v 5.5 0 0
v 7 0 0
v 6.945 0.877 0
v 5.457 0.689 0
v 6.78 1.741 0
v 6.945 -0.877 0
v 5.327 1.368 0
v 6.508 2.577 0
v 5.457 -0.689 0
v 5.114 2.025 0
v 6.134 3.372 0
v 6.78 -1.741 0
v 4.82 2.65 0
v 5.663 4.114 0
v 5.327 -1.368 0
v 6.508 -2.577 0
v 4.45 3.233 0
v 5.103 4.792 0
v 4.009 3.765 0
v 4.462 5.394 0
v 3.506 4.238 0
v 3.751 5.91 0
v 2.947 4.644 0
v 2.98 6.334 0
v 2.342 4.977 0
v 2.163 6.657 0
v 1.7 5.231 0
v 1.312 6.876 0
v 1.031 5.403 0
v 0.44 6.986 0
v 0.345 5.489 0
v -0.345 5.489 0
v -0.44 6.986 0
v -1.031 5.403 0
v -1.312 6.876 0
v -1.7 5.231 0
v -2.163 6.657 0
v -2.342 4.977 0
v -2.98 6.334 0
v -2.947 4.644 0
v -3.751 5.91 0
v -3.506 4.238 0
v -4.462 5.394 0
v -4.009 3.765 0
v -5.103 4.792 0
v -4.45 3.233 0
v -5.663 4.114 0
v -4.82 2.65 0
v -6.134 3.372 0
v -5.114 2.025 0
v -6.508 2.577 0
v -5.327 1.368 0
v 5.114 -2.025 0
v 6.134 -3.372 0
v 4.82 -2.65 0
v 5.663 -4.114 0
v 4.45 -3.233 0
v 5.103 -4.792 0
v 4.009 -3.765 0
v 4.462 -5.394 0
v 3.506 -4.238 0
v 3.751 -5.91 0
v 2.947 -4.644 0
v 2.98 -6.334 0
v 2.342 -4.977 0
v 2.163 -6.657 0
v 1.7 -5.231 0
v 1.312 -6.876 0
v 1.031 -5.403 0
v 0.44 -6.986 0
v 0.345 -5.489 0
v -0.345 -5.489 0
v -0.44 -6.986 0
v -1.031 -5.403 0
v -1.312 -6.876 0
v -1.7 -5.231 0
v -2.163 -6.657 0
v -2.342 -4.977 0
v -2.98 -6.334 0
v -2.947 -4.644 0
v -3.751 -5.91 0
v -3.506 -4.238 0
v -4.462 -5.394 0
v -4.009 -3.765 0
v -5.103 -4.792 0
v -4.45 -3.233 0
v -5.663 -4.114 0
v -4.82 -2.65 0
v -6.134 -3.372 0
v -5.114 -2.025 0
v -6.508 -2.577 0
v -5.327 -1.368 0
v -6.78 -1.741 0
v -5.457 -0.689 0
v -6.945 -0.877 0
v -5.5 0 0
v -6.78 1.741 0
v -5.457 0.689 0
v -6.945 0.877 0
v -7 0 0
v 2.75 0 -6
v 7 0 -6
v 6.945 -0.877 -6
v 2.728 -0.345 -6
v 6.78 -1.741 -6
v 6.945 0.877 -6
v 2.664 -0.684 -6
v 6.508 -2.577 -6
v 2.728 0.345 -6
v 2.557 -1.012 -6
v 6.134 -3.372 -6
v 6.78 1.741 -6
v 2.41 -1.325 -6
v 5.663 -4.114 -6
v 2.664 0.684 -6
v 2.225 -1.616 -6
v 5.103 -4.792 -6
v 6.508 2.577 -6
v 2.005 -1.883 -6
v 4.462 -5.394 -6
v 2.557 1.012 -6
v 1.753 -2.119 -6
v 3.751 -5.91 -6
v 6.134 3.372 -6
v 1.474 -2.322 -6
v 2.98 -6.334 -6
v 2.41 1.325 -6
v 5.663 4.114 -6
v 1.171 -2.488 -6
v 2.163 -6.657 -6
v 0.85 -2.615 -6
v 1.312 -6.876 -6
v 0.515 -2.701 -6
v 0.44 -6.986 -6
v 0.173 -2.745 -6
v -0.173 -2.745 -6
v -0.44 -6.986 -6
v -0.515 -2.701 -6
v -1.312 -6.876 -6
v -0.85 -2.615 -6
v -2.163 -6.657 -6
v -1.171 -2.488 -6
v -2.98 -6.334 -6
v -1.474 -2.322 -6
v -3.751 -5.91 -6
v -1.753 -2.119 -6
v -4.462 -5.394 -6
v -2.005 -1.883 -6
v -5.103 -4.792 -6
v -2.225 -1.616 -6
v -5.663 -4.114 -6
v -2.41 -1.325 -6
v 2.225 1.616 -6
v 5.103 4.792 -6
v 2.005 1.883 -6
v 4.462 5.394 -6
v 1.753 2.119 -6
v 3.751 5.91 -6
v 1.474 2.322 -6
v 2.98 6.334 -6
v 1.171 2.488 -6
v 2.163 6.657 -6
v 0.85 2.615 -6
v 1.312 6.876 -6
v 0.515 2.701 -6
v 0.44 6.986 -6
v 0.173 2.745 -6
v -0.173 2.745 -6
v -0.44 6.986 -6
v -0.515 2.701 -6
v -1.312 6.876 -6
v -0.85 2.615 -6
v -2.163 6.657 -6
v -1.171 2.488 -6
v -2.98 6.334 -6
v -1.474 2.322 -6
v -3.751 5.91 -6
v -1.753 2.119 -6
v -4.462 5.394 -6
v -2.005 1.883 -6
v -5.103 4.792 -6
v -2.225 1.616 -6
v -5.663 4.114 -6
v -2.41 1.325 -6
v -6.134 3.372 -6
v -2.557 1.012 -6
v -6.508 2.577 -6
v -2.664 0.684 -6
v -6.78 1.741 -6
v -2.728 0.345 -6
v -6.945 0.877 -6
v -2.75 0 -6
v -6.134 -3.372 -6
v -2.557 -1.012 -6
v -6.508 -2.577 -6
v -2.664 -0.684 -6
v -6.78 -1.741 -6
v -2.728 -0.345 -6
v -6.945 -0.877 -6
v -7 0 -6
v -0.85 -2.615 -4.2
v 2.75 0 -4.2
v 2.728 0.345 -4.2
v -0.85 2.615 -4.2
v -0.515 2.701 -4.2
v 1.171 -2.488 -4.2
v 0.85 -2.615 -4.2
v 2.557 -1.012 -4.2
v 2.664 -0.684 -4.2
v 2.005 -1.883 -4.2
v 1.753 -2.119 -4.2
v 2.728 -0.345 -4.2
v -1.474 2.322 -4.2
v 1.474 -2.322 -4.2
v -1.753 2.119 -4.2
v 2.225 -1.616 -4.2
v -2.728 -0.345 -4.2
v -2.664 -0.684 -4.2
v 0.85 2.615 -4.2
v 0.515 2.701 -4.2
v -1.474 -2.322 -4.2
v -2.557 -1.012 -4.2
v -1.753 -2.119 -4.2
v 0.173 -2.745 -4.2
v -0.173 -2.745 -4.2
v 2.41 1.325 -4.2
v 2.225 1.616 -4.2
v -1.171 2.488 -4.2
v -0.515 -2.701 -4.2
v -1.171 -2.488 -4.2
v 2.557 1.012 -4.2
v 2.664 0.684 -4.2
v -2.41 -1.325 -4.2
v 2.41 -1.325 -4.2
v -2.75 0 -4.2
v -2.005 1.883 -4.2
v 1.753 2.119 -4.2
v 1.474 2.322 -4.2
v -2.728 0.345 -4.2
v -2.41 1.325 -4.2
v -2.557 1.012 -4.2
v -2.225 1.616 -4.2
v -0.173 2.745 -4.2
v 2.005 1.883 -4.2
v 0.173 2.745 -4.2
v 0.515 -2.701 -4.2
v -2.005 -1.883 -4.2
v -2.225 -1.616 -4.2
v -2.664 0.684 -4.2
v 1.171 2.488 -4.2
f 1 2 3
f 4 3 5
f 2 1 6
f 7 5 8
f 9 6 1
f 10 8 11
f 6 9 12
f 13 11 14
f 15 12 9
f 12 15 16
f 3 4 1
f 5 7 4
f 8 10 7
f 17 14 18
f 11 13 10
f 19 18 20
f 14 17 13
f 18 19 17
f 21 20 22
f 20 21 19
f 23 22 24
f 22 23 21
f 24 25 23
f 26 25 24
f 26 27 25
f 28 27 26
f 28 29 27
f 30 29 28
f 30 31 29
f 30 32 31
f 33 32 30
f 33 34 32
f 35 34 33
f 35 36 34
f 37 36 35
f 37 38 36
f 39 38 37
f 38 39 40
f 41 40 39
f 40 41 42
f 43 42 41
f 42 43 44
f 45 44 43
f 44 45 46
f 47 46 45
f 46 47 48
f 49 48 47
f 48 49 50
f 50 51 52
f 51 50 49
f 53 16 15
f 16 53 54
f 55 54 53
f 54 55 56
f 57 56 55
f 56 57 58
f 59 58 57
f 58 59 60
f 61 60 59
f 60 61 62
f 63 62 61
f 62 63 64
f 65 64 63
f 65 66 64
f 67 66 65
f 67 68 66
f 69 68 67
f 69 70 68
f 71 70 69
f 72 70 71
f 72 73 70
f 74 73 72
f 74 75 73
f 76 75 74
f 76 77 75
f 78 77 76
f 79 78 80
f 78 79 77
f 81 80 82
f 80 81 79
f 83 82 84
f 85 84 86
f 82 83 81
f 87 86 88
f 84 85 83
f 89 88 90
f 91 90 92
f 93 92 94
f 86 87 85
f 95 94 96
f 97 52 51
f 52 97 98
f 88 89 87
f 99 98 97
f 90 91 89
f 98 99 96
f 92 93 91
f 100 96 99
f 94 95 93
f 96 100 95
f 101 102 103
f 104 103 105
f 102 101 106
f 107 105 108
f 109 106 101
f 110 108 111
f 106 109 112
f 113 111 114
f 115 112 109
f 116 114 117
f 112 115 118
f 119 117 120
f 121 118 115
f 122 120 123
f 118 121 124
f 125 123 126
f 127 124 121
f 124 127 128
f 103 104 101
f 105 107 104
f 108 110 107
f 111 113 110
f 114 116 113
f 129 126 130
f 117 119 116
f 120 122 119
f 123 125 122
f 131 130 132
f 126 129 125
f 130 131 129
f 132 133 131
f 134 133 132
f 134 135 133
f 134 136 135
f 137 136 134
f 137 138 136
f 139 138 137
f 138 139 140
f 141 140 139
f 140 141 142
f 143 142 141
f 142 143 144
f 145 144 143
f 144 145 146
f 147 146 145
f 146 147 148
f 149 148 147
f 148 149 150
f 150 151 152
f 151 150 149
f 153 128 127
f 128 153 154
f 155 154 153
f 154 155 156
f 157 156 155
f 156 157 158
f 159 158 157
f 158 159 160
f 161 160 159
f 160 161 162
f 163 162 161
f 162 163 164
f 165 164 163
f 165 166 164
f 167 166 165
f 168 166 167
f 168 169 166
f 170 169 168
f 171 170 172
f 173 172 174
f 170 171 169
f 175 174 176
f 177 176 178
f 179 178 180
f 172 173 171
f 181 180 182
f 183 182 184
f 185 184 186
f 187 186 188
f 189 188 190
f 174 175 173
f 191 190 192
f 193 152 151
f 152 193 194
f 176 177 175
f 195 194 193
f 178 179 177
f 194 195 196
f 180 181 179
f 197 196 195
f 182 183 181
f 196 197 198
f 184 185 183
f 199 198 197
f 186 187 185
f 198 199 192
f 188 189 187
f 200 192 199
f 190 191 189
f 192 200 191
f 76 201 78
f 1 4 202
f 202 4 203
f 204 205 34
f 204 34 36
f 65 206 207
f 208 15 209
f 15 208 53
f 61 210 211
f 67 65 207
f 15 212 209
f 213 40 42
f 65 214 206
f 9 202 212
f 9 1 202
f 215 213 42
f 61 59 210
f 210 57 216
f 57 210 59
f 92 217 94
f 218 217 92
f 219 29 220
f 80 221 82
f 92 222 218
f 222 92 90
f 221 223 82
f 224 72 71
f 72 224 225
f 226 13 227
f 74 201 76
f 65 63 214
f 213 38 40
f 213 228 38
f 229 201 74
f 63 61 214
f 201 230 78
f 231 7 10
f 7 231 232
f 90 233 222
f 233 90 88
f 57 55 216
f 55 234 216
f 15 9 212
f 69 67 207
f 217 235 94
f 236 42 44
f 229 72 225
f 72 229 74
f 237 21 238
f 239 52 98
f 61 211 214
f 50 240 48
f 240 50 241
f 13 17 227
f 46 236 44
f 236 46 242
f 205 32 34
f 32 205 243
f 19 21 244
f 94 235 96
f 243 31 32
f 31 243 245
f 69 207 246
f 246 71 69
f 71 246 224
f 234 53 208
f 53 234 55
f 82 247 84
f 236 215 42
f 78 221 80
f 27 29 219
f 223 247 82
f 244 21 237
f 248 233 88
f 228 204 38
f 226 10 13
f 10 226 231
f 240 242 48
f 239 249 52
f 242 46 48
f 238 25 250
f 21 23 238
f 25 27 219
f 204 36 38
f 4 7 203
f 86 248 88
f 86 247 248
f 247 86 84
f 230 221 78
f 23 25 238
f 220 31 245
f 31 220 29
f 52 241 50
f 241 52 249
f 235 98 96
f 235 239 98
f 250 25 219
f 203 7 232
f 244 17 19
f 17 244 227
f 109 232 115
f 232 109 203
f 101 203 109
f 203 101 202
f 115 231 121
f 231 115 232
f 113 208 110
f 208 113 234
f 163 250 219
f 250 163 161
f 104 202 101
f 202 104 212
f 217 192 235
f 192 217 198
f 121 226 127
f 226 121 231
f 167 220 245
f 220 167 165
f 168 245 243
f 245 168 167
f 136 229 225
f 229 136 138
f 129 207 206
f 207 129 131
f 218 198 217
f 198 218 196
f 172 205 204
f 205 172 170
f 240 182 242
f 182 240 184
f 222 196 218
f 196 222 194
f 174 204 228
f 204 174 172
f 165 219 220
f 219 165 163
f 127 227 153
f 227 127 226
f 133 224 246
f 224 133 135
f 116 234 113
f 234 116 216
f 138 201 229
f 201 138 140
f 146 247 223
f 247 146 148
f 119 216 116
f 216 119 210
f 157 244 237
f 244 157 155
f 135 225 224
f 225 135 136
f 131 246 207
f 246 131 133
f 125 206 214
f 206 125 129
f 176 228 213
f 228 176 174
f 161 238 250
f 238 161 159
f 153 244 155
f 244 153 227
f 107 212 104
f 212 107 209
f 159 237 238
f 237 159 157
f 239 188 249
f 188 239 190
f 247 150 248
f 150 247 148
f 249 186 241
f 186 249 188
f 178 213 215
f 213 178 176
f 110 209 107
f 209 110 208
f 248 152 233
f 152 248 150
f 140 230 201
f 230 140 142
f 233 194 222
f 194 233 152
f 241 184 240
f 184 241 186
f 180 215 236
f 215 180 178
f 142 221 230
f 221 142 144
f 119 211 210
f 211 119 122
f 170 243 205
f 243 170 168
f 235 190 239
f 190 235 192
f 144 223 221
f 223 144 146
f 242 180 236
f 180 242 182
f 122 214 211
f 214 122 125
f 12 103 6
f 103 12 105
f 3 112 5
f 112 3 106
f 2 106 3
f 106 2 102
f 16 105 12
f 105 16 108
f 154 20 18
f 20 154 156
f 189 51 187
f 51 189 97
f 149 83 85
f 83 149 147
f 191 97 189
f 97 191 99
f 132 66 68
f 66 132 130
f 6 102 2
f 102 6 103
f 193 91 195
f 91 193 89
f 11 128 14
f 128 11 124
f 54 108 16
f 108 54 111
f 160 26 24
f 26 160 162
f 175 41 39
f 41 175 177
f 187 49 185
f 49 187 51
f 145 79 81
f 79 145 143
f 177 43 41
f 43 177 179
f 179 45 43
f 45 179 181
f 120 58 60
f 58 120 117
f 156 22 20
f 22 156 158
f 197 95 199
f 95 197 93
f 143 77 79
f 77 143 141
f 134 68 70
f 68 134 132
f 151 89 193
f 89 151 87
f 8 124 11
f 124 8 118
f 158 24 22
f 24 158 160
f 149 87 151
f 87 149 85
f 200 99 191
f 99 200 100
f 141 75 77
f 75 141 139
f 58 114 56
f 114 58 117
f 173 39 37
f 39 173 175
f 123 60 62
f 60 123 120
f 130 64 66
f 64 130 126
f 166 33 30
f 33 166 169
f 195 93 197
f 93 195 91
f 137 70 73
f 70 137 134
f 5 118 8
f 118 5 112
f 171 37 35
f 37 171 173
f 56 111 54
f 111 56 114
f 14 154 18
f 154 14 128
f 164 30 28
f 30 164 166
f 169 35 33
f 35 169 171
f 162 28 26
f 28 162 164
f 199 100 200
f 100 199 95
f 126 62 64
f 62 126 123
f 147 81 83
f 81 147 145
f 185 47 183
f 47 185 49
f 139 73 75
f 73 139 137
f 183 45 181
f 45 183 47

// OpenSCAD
$fn = 50;


difference() {
	union() {
		translate(v = [0, 0, -6.0000000000]) {
			cylinder(h = 6, r = 7.0000000000);
		}
	}
	union() {
		translate(v = [0, 0, 0]) {
			rotate(a = [0, 0, 0]) {
				difference() {
					union() {
						translate(v = [0, 0, -6.0000000000]) {
							cylinder(h = 6, r = 2.2500000000);
						}
						translate(v = [0, 0, -4.2000000000]) {
							cylinder(h = 4.2000000000, r1 = 2.7500000000, r2 = 5.5000000000);
						}
						translate(v = [0, 0, -6.0000000000]) {
							cylinder(h = 6, r = 2.7500000000);
						}
						translate(v = [0, 0, -6.0000000000]) {
							cylinder(h = 6, r = 2.2500000000);
						}
					}
					union();
				}
			}
		}
	}
}
